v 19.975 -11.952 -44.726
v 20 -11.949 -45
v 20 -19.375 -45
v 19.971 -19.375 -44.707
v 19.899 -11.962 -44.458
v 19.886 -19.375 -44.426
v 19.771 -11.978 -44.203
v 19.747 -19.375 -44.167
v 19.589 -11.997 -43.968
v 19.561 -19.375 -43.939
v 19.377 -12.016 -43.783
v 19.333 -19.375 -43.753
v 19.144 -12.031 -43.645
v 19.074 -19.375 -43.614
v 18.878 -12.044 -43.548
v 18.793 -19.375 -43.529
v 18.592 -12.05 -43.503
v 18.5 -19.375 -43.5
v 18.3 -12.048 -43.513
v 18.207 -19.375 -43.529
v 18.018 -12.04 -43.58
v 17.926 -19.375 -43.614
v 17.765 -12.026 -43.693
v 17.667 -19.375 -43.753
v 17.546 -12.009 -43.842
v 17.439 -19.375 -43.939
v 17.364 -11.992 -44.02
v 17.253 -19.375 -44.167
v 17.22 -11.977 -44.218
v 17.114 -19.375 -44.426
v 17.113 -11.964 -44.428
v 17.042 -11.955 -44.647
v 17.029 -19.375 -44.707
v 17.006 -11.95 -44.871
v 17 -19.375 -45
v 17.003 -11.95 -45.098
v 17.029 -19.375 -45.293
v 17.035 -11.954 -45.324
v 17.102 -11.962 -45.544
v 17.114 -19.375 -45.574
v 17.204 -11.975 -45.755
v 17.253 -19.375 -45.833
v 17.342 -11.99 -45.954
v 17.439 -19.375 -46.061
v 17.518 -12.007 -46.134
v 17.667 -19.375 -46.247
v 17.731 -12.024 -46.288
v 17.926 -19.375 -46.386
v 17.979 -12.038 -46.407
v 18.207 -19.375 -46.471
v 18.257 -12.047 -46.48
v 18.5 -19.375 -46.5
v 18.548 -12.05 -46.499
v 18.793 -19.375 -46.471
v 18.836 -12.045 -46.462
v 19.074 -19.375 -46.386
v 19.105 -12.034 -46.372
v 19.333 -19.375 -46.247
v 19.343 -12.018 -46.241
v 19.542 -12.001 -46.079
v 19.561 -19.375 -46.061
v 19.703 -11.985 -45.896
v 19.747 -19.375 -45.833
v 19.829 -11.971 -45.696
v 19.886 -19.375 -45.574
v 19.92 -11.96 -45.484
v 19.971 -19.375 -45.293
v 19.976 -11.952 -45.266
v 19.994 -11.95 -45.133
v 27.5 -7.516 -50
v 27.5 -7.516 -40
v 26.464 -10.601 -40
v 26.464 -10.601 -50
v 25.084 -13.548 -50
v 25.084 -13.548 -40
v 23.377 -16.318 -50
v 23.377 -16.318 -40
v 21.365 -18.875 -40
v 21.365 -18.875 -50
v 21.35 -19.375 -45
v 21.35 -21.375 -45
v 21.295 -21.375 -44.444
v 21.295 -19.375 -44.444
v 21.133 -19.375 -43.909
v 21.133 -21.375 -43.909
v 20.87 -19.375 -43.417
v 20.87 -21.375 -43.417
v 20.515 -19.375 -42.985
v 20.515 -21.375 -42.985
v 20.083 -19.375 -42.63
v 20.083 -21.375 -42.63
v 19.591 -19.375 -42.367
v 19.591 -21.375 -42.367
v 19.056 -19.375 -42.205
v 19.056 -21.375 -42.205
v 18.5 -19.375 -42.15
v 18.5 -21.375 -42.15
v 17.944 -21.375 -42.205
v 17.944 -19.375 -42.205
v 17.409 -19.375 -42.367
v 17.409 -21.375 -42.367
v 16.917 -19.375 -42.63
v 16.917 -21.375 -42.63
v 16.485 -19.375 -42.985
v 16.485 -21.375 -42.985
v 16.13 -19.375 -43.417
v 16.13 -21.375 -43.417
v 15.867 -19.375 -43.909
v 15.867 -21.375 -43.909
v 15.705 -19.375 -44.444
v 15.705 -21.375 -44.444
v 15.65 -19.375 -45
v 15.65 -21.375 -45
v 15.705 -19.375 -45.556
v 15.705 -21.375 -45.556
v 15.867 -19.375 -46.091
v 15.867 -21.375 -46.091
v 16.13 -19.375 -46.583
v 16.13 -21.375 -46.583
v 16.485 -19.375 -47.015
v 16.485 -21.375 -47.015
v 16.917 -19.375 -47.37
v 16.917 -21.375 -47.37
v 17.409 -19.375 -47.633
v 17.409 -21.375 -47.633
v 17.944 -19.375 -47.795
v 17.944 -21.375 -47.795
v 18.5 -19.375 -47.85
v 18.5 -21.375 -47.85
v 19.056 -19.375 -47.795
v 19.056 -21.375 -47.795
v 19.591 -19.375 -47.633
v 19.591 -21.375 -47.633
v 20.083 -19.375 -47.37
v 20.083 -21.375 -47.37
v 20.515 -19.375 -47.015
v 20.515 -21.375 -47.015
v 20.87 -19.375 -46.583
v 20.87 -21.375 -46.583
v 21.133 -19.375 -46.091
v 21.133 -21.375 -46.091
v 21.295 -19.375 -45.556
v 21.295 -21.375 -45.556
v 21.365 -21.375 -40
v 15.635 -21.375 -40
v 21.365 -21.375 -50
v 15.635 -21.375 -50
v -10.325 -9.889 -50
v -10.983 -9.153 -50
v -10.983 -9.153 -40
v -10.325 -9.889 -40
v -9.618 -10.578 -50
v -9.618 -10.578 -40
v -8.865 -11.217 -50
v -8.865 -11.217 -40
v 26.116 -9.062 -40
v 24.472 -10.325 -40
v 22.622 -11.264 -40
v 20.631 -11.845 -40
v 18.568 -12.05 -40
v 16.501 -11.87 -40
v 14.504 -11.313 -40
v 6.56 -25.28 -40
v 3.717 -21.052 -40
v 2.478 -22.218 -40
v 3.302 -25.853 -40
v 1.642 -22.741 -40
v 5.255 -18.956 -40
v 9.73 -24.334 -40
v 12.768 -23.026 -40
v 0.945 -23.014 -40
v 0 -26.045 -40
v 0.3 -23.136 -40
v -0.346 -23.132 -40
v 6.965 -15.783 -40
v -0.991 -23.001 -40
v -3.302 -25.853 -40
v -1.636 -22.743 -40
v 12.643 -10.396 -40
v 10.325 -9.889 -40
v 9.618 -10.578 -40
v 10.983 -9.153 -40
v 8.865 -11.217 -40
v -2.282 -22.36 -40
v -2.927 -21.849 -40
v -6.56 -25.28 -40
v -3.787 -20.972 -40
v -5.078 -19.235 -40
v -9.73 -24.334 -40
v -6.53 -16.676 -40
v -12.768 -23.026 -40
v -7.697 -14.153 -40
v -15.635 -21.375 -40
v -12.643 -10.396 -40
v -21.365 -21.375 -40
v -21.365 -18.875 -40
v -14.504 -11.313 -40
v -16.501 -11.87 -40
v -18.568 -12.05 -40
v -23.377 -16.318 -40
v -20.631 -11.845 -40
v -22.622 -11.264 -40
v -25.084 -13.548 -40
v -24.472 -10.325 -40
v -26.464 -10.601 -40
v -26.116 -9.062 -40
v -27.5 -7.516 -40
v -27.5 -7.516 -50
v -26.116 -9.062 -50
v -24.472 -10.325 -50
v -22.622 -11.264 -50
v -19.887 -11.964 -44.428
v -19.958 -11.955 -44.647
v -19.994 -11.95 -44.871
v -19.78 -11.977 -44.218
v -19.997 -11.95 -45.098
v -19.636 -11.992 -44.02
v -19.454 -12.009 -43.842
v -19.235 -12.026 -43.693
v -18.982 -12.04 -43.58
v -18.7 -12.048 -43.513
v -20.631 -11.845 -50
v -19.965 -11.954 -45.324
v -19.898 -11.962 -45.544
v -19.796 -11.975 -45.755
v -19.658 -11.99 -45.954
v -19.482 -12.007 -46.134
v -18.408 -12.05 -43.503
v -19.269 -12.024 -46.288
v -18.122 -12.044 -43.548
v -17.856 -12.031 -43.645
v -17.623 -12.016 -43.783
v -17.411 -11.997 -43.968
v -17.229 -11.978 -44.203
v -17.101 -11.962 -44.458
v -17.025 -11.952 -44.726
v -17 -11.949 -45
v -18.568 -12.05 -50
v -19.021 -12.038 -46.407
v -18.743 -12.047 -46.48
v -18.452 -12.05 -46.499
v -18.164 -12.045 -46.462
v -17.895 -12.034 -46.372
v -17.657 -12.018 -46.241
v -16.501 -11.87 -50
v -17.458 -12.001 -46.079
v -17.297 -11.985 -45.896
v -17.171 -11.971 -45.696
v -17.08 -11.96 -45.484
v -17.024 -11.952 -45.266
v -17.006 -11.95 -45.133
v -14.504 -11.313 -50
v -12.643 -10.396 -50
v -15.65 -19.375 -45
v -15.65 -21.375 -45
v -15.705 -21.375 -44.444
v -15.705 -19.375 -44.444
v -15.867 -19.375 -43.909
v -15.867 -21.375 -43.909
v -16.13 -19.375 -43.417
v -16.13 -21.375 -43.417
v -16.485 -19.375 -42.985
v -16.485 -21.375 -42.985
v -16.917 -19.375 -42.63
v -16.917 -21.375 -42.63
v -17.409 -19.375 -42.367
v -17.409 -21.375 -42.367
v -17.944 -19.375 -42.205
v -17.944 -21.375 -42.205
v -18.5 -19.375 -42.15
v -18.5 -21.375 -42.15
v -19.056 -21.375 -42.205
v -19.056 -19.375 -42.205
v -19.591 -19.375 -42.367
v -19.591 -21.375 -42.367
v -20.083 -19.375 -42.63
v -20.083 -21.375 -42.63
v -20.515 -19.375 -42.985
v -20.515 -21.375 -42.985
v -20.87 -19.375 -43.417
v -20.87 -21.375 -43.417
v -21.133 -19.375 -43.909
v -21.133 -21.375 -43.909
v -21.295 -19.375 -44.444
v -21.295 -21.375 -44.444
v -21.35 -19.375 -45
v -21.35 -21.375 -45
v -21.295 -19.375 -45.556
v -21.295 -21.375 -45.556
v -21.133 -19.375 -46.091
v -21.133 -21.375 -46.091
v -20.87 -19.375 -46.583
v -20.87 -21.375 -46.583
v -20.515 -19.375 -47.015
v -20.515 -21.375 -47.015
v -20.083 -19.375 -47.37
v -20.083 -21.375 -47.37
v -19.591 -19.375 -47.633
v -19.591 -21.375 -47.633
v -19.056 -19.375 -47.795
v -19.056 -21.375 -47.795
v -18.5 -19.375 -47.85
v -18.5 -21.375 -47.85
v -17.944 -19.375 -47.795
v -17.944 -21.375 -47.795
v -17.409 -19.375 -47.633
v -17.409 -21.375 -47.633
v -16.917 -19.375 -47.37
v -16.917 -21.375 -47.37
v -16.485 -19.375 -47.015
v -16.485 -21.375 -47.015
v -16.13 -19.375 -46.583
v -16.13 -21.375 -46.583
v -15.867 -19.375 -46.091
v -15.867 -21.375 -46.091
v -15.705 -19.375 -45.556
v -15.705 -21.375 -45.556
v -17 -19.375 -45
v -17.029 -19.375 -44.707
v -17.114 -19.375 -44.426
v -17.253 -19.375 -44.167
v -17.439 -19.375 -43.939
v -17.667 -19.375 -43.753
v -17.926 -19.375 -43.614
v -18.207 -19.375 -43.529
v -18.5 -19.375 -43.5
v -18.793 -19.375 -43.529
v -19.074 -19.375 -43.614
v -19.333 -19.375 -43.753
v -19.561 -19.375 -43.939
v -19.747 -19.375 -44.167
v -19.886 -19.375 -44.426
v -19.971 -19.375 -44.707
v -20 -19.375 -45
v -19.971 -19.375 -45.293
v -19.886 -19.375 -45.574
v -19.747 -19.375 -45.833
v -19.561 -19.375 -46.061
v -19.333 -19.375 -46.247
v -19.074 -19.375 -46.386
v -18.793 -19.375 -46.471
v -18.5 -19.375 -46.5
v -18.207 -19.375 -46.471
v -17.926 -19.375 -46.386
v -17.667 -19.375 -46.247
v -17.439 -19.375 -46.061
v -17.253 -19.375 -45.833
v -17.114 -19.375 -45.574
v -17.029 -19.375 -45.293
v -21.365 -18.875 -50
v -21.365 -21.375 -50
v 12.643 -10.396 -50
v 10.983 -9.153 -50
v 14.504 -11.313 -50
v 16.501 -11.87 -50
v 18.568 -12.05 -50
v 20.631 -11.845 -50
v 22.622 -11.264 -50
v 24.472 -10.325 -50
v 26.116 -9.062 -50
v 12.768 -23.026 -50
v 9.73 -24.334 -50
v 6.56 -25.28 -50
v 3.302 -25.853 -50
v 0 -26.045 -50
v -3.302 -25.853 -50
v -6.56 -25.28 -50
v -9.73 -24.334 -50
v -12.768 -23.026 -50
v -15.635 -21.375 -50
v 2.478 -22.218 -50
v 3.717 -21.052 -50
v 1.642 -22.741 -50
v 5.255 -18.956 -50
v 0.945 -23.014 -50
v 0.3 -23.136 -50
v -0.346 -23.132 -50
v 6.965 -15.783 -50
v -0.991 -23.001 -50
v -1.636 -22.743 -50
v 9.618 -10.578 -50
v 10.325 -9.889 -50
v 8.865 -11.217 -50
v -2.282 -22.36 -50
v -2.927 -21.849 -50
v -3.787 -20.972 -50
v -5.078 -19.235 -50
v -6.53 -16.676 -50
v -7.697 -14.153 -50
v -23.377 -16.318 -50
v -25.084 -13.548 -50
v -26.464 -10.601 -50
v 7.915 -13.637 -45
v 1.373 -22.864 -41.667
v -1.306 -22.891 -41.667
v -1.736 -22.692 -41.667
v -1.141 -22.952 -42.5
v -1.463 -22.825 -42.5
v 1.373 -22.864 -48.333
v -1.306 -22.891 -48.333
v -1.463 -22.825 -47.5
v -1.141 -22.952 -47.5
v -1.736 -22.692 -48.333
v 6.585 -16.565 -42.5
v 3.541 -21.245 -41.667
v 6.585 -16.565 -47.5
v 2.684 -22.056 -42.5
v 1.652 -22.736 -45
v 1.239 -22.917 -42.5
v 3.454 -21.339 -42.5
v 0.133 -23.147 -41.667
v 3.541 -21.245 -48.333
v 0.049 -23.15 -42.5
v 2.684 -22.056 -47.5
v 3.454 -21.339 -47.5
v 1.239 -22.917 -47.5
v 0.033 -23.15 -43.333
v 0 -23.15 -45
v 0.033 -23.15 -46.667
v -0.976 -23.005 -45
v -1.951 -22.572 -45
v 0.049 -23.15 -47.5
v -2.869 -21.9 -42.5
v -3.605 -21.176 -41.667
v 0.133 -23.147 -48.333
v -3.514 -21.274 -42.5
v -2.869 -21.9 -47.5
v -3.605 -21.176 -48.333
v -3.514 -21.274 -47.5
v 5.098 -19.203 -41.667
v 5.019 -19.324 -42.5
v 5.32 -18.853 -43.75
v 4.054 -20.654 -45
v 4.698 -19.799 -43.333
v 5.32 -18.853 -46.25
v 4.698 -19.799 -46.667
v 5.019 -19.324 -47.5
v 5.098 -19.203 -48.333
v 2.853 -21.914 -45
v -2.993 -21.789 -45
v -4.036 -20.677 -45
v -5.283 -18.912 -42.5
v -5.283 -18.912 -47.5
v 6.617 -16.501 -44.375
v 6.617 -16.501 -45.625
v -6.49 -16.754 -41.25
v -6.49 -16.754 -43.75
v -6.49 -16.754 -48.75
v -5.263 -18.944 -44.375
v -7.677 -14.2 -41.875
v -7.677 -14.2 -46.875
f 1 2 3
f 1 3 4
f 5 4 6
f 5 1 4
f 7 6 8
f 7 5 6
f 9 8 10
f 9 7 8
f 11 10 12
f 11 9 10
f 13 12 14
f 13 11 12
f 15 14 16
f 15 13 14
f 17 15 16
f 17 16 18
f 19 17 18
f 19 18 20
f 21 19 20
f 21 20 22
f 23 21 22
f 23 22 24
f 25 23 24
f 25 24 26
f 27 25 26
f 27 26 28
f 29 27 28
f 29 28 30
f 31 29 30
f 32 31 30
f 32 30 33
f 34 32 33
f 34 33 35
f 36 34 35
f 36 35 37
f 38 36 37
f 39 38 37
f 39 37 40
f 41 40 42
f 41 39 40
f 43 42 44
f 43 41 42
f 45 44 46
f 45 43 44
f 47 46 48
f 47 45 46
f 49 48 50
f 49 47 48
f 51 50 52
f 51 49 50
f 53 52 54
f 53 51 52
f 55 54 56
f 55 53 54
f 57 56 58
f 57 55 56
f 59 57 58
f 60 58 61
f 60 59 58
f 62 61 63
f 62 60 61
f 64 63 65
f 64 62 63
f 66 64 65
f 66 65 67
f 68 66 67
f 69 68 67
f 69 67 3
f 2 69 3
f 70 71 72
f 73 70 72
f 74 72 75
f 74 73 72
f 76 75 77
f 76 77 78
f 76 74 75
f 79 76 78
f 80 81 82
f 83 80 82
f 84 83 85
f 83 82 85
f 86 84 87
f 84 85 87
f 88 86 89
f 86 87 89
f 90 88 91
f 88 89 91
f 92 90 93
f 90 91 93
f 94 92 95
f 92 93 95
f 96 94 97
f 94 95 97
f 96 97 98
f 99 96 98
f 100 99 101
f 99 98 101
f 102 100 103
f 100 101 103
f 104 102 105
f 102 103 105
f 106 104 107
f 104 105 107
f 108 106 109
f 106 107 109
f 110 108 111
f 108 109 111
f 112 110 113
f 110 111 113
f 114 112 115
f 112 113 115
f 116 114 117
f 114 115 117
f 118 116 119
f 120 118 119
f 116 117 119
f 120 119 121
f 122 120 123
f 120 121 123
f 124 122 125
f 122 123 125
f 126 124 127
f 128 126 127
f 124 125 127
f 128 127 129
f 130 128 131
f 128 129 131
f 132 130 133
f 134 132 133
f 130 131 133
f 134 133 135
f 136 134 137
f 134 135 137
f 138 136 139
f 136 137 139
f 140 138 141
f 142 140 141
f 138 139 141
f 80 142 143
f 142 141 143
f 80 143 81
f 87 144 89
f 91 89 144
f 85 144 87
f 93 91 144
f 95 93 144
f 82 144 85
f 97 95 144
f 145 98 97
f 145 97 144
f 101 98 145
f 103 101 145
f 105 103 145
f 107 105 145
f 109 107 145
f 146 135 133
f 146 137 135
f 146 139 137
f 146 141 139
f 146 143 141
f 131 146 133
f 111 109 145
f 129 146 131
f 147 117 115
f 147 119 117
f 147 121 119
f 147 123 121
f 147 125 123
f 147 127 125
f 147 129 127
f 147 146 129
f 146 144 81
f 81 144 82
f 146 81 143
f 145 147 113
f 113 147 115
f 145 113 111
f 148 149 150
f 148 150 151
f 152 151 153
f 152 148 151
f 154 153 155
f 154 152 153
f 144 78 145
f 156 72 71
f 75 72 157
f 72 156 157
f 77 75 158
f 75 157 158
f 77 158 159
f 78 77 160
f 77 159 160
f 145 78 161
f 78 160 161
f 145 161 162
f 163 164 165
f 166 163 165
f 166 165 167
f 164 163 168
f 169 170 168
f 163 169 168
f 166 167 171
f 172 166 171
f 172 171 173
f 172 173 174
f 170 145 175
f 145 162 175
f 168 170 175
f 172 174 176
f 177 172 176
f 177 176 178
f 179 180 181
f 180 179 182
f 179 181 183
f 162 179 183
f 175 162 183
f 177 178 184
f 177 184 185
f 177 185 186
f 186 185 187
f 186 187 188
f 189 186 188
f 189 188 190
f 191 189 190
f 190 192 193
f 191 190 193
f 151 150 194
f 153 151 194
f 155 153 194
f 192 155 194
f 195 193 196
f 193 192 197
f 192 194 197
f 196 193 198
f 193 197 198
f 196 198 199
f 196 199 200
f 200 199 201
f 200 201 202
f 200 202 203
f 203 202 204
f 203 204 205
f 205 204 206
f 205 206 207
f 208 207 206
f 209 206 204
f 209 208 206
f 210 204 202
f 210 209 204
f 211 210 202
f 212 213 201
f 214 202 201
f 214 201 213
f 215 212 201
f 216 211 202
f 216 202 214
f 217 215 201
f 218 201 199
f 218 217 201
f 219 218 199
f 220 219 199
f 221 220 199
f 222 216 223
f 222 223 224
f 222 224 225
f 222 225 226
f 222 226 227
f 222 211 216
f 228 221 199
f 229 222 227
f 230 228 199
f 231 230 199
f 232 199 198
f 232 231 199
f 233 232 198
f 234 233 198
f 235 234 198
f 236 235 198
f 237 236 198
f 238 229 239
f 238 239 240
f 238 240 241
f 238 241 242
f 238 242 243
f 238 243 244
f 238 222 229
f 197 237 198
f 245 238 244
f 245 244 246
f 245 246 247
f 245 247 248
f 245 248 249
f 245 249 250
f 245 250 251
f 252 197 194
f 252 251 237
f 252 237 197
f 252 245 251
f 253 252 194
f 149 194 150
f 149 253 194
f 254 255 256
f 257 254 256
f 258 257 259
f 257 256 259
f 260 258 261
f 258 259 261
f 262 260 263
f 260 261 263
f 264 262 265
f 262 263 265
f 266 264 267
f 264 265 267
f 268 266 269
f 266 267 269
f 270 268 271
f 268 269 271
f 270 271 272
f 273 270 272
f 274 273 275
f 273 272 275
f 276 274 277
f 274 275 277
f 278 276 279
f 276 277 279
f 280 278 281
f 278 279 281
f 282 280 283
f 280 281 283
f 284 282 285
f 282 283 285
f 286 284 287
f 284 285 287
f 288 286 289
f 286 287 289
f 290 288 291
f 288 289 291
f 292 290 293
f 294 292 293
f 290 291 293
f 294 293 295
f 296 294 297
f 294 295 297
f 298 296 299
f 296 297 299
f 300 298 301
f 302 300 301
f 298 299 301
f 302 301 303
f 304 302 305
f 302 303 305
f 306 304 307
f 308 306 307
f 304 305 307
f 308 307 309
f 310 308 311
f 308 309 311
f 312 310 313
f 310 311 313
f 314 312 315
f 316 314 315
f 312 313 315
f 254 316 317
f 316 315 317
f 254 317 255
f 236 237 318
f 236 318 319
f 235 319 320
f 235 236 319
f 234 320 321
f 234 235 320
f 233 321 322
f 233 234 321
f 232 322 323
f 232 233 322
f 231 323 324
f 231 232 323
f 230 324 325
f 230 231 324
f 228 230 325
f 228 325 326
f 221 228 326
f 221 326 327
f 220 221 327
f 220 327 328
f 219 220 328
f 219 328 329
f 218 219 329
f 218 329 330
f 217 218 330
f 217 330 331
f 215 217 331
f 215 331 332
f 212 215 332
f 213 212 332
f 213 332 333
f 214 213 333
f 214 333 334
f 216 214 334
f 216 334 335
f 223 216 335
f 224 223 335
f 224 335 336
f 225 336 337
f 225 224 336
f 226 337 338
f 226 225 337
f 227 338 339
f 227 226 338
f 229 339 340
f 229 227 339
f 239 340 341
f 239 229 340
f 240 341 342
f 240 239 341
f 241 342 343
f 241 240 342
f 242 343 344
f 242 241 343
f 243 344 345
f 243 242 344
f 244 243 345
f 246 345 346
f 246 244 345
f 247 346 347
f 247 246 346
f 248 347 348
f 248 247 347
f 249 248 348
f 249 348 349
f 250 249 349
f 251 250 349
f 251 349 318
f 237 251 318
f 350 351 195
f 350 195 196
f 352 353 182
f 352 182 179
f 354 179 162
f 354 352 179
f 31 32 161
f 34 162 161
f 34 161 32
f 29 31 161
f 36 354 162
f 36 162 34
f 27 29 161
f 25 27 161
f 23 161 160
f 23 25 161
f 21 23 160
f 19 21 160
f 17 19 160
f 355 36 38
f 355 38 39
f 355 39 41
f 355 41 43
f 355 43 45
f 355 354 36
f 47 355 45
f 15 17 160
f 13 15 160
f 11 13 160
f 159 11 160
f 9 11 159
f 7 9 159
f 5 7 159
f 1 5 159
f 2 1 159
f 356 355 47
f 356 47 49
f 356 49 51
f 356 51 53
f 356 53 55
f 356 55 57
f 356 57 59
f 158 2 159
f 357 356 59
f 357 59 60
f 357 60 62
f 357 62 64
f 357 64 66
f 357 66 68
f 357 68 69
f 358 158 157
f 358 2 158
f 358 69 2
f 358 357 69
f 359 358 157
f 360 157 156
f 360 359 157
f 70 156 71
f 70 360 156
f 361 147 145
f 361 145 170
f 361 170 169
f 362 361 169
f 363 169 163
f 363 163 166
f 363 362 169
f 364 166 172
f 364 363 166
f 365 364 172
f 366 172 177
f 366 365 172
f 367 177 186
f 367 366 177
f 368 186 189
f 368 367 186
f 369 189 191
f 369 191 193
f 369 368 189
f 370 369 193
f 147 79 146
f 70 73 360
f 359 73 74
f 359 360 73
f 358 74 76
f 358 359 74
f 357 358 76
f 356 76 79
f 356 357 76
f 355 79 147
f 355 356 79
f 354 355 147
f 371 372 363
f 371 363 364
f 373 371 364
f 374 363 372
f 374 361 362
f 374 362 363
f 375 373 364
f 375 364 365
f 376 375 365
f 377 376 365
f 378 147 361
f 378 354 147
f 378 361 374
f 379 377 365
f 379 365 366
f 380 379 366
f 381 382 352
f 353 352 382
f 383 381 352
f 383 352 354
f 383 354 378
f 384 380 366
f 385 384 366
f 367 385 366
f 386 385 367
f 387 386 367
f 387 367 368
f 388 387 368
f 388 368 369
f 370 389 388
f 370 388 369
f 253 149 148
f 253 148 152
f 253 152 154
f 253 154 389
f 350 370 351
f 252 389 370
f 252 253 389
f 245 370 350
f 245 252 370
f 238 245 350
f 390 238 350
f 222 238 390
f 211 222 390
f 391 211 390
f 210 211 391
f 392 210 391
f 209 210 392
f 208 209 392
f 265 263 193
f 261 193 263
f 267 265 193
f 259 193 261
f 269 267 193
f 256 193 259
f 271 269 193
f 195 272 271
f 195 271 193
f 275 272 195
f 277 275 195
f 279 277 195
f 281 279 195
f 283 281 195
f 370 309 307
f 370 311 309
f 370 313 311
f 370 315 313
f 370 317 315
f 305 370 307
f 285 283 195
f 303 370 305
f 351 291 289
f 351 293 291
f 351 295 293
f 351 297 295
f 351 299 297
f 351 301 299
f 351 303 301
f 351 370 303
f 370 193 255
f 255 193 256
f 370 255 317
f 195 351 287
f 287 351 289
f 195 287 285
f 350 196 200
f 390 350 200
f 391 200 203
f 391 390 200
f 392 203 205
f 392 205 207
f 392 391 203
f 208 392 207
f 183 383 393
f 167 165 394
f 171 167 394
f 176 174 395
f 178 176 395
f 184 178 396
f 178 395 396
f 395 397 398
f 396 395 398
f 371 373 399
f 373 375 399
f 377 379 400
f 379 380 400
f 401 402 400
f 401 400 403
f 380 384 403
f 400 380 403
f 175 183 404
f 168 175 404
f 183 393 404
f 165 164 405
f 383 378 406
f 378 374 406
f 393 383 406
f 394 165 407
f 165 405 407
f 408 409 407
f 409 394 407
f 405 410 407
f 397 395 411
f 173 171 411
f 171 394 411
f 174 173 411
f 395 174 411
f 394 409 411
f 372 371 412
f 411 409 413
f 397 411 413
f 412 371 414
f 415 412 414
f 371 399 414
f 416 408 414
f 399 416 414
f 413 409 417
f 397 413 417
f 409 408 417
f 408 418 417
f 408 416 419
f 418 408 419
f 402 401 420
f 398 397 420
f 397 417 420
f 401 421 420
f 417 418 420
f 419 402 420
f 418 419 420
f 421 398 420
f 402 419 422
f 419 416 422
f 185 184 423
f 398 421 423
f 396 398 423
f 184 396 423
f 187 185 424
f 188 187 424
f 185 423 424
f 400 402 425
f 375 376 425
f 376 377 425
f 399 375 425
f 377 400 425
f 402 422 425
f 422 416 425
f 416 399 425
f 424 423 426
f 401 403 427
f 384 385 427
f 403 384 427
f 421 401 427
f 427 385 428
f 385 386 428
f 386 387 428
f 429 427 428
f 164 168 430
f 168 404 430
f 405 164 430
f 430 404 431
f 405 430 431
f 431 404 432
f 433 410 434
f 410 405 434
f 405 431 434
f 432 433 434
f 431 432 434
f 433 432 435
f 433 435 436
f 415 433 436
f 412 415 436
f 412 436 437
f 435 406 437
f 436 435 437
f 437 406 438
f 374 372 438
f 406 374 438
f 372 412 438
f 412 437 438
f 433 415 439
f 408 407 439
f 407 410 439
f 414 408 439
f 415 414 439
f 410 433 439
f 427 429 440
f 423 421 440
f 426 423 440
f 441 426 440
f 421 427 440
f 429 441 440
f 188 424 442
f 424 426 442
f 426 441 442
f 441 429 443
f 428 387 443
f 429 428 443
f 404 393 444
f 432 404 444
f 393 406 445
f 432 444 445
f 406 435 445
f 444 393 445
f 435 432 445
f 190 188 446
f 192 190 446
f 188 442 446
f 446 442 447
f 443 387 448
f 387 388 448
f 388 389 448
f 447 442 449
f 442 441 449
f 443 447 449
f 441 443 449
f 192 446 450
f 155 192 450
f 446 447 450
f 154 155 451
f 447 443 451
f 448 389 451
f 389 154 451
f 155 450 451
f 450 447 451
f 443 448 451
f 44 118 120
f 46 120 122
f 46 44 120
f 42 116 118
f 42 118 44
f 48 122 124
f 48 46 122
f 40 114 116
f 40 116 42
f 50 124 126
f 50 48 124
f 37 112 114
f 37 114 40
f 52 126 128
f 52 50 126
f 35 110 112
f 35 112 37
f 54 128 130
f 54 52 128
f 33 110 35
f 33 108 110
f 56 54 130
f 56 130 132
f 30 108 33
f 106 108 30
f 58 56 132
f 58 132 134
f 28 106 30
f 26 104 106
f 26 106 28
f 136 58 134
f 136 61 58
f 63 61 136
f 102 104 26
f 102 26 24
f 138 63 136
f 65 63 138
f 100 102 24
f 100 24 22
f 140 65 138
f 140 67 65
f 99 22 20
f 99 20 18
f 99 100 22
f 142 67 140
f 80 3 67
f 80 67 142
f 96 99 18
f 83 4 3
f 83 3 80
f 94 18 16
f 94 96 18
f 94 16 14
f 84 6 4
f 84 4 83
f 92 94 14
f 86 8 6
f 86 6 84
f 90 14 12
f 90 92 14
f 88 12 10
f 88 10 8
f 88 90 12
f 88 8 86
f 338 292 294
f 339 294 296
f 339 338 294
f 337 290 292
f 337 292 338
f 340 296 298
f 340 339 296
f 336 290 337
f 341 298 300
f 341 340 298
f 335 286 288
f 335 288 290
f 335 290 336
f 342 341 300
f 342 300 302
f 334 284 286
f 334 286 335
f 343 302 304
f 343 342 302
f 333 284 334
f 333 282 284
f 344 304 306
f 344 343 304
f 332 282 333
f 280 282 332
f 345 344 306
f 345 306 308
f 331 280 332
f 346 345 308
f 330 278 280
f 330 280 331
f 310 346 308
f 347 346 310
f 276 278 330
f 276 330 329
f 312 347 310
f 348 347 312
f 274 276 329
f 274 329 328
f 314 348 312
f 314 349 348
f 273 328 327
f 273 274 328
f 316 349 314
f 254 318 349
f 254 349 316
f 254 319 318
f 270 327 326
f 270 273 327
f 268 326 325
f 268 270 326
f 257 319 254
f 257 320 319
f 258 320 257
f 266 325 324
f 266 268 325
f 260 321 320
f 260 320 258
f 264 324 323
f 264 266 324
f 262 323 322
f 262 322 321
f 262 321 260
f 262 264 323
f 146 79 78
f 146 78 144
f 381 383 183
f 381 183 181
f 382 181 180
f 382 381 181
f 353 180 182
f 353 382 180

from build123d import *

# Parameters (mm, degrees)
PAD017_DEPTH         = 10
SKETCH027_R          = 1.5
POCKET015_DEPTH      = 0.001
POCKET015_DEPTH_BACK = 26.046246
SKETCH028_R          = 2.85
POCKET016_DEPTH      = 2


with BuildPart() as part:
    # Sketch026 → Pad017 (new body)
    with BuildSketch(Plane.XY):
        with BuildLine():
            ThreePointArc((-21.365, -18.875435), (-25.083946, -13.547727), (-27.5, -7.516333))
            ThreePointArc((-27.5, -7.516333), (-19.604248, -11.995431), (-10.983083, -9.152768))
            ThreePointArc((-10.983083, -9.152768), (-9.977451, -10.239713), (-8.864785, -11.216811))
            add(Edge.make_bspline(
                [(8.864785, -11.216811), (0, -35.083189), (-8.864785, -11.216811)],
                knots=[-8.864785, -8.864785, -8.864785, 8.864785, 8.864785, 8.864785], degree=2))
            ThreePointArc((8.864785, -11.216811), (9.977451, -10.239713), (10.983083, -9.152768))
            ThreePointArc((10.983083, -9.152768), (19.604248, -11.995431), (27.5, -7.516333))
            ThreePointArc((27.5, -7.516333), (25.083946, -13.547727), (21.365, -18.875435))
            Line((21.365, -18.875435), (21.365, -21.375435))
            Line((21.365, -21.375435), (15.635, -21.375435))
            ThreePointArc((15.635, -21.375435), (0, -26.045246), (-15.635, -21.375435))
            Line((-15.635, -21.375435), (-21.365, -21.375435))
            Line((-21.365, -21.375435), (-21.365, -18.875435))
        make_face()
    extrude(amount=PAD017_DEPTH)

    # Sketch027 → Pocket015 (cut, two sides)
    with BuildSketch(Plane.XZ) as pocket015_sk:
        with Locations((-18.5, 5)):
            Circle(SKETCH027_R)
        with Locations((18.5, 5)):
            Circle(SKETCH027_R)
    extrude(amount=-POCKET015_DEPTH, mode=Mode.SUBTRACT)
    extrude(pocket015_sk.sketch, amount=POCKET015_DEPTH_BACK, mode=Mode.SUBTRACT)

    # Sketch028 (on DatumPlane) → Pocket016 (cut)
    with BuildSketch(Plane.XZ.offset(21.375435)):
        with Locations((-18.5, 5)):
            Circle(SKETCH028_R)
        with Locations((18.5, 5)):
            Circle(SKETCH028_R)
    extrude(amount=-POCKET016_DEPTH, mode=Mode.SUBTRACT)


with BuildPart() as part_1:
    # Body008 placement: moved
    add(part.part.moved(Location((0, 0, -50))))


solid = part_1.part
